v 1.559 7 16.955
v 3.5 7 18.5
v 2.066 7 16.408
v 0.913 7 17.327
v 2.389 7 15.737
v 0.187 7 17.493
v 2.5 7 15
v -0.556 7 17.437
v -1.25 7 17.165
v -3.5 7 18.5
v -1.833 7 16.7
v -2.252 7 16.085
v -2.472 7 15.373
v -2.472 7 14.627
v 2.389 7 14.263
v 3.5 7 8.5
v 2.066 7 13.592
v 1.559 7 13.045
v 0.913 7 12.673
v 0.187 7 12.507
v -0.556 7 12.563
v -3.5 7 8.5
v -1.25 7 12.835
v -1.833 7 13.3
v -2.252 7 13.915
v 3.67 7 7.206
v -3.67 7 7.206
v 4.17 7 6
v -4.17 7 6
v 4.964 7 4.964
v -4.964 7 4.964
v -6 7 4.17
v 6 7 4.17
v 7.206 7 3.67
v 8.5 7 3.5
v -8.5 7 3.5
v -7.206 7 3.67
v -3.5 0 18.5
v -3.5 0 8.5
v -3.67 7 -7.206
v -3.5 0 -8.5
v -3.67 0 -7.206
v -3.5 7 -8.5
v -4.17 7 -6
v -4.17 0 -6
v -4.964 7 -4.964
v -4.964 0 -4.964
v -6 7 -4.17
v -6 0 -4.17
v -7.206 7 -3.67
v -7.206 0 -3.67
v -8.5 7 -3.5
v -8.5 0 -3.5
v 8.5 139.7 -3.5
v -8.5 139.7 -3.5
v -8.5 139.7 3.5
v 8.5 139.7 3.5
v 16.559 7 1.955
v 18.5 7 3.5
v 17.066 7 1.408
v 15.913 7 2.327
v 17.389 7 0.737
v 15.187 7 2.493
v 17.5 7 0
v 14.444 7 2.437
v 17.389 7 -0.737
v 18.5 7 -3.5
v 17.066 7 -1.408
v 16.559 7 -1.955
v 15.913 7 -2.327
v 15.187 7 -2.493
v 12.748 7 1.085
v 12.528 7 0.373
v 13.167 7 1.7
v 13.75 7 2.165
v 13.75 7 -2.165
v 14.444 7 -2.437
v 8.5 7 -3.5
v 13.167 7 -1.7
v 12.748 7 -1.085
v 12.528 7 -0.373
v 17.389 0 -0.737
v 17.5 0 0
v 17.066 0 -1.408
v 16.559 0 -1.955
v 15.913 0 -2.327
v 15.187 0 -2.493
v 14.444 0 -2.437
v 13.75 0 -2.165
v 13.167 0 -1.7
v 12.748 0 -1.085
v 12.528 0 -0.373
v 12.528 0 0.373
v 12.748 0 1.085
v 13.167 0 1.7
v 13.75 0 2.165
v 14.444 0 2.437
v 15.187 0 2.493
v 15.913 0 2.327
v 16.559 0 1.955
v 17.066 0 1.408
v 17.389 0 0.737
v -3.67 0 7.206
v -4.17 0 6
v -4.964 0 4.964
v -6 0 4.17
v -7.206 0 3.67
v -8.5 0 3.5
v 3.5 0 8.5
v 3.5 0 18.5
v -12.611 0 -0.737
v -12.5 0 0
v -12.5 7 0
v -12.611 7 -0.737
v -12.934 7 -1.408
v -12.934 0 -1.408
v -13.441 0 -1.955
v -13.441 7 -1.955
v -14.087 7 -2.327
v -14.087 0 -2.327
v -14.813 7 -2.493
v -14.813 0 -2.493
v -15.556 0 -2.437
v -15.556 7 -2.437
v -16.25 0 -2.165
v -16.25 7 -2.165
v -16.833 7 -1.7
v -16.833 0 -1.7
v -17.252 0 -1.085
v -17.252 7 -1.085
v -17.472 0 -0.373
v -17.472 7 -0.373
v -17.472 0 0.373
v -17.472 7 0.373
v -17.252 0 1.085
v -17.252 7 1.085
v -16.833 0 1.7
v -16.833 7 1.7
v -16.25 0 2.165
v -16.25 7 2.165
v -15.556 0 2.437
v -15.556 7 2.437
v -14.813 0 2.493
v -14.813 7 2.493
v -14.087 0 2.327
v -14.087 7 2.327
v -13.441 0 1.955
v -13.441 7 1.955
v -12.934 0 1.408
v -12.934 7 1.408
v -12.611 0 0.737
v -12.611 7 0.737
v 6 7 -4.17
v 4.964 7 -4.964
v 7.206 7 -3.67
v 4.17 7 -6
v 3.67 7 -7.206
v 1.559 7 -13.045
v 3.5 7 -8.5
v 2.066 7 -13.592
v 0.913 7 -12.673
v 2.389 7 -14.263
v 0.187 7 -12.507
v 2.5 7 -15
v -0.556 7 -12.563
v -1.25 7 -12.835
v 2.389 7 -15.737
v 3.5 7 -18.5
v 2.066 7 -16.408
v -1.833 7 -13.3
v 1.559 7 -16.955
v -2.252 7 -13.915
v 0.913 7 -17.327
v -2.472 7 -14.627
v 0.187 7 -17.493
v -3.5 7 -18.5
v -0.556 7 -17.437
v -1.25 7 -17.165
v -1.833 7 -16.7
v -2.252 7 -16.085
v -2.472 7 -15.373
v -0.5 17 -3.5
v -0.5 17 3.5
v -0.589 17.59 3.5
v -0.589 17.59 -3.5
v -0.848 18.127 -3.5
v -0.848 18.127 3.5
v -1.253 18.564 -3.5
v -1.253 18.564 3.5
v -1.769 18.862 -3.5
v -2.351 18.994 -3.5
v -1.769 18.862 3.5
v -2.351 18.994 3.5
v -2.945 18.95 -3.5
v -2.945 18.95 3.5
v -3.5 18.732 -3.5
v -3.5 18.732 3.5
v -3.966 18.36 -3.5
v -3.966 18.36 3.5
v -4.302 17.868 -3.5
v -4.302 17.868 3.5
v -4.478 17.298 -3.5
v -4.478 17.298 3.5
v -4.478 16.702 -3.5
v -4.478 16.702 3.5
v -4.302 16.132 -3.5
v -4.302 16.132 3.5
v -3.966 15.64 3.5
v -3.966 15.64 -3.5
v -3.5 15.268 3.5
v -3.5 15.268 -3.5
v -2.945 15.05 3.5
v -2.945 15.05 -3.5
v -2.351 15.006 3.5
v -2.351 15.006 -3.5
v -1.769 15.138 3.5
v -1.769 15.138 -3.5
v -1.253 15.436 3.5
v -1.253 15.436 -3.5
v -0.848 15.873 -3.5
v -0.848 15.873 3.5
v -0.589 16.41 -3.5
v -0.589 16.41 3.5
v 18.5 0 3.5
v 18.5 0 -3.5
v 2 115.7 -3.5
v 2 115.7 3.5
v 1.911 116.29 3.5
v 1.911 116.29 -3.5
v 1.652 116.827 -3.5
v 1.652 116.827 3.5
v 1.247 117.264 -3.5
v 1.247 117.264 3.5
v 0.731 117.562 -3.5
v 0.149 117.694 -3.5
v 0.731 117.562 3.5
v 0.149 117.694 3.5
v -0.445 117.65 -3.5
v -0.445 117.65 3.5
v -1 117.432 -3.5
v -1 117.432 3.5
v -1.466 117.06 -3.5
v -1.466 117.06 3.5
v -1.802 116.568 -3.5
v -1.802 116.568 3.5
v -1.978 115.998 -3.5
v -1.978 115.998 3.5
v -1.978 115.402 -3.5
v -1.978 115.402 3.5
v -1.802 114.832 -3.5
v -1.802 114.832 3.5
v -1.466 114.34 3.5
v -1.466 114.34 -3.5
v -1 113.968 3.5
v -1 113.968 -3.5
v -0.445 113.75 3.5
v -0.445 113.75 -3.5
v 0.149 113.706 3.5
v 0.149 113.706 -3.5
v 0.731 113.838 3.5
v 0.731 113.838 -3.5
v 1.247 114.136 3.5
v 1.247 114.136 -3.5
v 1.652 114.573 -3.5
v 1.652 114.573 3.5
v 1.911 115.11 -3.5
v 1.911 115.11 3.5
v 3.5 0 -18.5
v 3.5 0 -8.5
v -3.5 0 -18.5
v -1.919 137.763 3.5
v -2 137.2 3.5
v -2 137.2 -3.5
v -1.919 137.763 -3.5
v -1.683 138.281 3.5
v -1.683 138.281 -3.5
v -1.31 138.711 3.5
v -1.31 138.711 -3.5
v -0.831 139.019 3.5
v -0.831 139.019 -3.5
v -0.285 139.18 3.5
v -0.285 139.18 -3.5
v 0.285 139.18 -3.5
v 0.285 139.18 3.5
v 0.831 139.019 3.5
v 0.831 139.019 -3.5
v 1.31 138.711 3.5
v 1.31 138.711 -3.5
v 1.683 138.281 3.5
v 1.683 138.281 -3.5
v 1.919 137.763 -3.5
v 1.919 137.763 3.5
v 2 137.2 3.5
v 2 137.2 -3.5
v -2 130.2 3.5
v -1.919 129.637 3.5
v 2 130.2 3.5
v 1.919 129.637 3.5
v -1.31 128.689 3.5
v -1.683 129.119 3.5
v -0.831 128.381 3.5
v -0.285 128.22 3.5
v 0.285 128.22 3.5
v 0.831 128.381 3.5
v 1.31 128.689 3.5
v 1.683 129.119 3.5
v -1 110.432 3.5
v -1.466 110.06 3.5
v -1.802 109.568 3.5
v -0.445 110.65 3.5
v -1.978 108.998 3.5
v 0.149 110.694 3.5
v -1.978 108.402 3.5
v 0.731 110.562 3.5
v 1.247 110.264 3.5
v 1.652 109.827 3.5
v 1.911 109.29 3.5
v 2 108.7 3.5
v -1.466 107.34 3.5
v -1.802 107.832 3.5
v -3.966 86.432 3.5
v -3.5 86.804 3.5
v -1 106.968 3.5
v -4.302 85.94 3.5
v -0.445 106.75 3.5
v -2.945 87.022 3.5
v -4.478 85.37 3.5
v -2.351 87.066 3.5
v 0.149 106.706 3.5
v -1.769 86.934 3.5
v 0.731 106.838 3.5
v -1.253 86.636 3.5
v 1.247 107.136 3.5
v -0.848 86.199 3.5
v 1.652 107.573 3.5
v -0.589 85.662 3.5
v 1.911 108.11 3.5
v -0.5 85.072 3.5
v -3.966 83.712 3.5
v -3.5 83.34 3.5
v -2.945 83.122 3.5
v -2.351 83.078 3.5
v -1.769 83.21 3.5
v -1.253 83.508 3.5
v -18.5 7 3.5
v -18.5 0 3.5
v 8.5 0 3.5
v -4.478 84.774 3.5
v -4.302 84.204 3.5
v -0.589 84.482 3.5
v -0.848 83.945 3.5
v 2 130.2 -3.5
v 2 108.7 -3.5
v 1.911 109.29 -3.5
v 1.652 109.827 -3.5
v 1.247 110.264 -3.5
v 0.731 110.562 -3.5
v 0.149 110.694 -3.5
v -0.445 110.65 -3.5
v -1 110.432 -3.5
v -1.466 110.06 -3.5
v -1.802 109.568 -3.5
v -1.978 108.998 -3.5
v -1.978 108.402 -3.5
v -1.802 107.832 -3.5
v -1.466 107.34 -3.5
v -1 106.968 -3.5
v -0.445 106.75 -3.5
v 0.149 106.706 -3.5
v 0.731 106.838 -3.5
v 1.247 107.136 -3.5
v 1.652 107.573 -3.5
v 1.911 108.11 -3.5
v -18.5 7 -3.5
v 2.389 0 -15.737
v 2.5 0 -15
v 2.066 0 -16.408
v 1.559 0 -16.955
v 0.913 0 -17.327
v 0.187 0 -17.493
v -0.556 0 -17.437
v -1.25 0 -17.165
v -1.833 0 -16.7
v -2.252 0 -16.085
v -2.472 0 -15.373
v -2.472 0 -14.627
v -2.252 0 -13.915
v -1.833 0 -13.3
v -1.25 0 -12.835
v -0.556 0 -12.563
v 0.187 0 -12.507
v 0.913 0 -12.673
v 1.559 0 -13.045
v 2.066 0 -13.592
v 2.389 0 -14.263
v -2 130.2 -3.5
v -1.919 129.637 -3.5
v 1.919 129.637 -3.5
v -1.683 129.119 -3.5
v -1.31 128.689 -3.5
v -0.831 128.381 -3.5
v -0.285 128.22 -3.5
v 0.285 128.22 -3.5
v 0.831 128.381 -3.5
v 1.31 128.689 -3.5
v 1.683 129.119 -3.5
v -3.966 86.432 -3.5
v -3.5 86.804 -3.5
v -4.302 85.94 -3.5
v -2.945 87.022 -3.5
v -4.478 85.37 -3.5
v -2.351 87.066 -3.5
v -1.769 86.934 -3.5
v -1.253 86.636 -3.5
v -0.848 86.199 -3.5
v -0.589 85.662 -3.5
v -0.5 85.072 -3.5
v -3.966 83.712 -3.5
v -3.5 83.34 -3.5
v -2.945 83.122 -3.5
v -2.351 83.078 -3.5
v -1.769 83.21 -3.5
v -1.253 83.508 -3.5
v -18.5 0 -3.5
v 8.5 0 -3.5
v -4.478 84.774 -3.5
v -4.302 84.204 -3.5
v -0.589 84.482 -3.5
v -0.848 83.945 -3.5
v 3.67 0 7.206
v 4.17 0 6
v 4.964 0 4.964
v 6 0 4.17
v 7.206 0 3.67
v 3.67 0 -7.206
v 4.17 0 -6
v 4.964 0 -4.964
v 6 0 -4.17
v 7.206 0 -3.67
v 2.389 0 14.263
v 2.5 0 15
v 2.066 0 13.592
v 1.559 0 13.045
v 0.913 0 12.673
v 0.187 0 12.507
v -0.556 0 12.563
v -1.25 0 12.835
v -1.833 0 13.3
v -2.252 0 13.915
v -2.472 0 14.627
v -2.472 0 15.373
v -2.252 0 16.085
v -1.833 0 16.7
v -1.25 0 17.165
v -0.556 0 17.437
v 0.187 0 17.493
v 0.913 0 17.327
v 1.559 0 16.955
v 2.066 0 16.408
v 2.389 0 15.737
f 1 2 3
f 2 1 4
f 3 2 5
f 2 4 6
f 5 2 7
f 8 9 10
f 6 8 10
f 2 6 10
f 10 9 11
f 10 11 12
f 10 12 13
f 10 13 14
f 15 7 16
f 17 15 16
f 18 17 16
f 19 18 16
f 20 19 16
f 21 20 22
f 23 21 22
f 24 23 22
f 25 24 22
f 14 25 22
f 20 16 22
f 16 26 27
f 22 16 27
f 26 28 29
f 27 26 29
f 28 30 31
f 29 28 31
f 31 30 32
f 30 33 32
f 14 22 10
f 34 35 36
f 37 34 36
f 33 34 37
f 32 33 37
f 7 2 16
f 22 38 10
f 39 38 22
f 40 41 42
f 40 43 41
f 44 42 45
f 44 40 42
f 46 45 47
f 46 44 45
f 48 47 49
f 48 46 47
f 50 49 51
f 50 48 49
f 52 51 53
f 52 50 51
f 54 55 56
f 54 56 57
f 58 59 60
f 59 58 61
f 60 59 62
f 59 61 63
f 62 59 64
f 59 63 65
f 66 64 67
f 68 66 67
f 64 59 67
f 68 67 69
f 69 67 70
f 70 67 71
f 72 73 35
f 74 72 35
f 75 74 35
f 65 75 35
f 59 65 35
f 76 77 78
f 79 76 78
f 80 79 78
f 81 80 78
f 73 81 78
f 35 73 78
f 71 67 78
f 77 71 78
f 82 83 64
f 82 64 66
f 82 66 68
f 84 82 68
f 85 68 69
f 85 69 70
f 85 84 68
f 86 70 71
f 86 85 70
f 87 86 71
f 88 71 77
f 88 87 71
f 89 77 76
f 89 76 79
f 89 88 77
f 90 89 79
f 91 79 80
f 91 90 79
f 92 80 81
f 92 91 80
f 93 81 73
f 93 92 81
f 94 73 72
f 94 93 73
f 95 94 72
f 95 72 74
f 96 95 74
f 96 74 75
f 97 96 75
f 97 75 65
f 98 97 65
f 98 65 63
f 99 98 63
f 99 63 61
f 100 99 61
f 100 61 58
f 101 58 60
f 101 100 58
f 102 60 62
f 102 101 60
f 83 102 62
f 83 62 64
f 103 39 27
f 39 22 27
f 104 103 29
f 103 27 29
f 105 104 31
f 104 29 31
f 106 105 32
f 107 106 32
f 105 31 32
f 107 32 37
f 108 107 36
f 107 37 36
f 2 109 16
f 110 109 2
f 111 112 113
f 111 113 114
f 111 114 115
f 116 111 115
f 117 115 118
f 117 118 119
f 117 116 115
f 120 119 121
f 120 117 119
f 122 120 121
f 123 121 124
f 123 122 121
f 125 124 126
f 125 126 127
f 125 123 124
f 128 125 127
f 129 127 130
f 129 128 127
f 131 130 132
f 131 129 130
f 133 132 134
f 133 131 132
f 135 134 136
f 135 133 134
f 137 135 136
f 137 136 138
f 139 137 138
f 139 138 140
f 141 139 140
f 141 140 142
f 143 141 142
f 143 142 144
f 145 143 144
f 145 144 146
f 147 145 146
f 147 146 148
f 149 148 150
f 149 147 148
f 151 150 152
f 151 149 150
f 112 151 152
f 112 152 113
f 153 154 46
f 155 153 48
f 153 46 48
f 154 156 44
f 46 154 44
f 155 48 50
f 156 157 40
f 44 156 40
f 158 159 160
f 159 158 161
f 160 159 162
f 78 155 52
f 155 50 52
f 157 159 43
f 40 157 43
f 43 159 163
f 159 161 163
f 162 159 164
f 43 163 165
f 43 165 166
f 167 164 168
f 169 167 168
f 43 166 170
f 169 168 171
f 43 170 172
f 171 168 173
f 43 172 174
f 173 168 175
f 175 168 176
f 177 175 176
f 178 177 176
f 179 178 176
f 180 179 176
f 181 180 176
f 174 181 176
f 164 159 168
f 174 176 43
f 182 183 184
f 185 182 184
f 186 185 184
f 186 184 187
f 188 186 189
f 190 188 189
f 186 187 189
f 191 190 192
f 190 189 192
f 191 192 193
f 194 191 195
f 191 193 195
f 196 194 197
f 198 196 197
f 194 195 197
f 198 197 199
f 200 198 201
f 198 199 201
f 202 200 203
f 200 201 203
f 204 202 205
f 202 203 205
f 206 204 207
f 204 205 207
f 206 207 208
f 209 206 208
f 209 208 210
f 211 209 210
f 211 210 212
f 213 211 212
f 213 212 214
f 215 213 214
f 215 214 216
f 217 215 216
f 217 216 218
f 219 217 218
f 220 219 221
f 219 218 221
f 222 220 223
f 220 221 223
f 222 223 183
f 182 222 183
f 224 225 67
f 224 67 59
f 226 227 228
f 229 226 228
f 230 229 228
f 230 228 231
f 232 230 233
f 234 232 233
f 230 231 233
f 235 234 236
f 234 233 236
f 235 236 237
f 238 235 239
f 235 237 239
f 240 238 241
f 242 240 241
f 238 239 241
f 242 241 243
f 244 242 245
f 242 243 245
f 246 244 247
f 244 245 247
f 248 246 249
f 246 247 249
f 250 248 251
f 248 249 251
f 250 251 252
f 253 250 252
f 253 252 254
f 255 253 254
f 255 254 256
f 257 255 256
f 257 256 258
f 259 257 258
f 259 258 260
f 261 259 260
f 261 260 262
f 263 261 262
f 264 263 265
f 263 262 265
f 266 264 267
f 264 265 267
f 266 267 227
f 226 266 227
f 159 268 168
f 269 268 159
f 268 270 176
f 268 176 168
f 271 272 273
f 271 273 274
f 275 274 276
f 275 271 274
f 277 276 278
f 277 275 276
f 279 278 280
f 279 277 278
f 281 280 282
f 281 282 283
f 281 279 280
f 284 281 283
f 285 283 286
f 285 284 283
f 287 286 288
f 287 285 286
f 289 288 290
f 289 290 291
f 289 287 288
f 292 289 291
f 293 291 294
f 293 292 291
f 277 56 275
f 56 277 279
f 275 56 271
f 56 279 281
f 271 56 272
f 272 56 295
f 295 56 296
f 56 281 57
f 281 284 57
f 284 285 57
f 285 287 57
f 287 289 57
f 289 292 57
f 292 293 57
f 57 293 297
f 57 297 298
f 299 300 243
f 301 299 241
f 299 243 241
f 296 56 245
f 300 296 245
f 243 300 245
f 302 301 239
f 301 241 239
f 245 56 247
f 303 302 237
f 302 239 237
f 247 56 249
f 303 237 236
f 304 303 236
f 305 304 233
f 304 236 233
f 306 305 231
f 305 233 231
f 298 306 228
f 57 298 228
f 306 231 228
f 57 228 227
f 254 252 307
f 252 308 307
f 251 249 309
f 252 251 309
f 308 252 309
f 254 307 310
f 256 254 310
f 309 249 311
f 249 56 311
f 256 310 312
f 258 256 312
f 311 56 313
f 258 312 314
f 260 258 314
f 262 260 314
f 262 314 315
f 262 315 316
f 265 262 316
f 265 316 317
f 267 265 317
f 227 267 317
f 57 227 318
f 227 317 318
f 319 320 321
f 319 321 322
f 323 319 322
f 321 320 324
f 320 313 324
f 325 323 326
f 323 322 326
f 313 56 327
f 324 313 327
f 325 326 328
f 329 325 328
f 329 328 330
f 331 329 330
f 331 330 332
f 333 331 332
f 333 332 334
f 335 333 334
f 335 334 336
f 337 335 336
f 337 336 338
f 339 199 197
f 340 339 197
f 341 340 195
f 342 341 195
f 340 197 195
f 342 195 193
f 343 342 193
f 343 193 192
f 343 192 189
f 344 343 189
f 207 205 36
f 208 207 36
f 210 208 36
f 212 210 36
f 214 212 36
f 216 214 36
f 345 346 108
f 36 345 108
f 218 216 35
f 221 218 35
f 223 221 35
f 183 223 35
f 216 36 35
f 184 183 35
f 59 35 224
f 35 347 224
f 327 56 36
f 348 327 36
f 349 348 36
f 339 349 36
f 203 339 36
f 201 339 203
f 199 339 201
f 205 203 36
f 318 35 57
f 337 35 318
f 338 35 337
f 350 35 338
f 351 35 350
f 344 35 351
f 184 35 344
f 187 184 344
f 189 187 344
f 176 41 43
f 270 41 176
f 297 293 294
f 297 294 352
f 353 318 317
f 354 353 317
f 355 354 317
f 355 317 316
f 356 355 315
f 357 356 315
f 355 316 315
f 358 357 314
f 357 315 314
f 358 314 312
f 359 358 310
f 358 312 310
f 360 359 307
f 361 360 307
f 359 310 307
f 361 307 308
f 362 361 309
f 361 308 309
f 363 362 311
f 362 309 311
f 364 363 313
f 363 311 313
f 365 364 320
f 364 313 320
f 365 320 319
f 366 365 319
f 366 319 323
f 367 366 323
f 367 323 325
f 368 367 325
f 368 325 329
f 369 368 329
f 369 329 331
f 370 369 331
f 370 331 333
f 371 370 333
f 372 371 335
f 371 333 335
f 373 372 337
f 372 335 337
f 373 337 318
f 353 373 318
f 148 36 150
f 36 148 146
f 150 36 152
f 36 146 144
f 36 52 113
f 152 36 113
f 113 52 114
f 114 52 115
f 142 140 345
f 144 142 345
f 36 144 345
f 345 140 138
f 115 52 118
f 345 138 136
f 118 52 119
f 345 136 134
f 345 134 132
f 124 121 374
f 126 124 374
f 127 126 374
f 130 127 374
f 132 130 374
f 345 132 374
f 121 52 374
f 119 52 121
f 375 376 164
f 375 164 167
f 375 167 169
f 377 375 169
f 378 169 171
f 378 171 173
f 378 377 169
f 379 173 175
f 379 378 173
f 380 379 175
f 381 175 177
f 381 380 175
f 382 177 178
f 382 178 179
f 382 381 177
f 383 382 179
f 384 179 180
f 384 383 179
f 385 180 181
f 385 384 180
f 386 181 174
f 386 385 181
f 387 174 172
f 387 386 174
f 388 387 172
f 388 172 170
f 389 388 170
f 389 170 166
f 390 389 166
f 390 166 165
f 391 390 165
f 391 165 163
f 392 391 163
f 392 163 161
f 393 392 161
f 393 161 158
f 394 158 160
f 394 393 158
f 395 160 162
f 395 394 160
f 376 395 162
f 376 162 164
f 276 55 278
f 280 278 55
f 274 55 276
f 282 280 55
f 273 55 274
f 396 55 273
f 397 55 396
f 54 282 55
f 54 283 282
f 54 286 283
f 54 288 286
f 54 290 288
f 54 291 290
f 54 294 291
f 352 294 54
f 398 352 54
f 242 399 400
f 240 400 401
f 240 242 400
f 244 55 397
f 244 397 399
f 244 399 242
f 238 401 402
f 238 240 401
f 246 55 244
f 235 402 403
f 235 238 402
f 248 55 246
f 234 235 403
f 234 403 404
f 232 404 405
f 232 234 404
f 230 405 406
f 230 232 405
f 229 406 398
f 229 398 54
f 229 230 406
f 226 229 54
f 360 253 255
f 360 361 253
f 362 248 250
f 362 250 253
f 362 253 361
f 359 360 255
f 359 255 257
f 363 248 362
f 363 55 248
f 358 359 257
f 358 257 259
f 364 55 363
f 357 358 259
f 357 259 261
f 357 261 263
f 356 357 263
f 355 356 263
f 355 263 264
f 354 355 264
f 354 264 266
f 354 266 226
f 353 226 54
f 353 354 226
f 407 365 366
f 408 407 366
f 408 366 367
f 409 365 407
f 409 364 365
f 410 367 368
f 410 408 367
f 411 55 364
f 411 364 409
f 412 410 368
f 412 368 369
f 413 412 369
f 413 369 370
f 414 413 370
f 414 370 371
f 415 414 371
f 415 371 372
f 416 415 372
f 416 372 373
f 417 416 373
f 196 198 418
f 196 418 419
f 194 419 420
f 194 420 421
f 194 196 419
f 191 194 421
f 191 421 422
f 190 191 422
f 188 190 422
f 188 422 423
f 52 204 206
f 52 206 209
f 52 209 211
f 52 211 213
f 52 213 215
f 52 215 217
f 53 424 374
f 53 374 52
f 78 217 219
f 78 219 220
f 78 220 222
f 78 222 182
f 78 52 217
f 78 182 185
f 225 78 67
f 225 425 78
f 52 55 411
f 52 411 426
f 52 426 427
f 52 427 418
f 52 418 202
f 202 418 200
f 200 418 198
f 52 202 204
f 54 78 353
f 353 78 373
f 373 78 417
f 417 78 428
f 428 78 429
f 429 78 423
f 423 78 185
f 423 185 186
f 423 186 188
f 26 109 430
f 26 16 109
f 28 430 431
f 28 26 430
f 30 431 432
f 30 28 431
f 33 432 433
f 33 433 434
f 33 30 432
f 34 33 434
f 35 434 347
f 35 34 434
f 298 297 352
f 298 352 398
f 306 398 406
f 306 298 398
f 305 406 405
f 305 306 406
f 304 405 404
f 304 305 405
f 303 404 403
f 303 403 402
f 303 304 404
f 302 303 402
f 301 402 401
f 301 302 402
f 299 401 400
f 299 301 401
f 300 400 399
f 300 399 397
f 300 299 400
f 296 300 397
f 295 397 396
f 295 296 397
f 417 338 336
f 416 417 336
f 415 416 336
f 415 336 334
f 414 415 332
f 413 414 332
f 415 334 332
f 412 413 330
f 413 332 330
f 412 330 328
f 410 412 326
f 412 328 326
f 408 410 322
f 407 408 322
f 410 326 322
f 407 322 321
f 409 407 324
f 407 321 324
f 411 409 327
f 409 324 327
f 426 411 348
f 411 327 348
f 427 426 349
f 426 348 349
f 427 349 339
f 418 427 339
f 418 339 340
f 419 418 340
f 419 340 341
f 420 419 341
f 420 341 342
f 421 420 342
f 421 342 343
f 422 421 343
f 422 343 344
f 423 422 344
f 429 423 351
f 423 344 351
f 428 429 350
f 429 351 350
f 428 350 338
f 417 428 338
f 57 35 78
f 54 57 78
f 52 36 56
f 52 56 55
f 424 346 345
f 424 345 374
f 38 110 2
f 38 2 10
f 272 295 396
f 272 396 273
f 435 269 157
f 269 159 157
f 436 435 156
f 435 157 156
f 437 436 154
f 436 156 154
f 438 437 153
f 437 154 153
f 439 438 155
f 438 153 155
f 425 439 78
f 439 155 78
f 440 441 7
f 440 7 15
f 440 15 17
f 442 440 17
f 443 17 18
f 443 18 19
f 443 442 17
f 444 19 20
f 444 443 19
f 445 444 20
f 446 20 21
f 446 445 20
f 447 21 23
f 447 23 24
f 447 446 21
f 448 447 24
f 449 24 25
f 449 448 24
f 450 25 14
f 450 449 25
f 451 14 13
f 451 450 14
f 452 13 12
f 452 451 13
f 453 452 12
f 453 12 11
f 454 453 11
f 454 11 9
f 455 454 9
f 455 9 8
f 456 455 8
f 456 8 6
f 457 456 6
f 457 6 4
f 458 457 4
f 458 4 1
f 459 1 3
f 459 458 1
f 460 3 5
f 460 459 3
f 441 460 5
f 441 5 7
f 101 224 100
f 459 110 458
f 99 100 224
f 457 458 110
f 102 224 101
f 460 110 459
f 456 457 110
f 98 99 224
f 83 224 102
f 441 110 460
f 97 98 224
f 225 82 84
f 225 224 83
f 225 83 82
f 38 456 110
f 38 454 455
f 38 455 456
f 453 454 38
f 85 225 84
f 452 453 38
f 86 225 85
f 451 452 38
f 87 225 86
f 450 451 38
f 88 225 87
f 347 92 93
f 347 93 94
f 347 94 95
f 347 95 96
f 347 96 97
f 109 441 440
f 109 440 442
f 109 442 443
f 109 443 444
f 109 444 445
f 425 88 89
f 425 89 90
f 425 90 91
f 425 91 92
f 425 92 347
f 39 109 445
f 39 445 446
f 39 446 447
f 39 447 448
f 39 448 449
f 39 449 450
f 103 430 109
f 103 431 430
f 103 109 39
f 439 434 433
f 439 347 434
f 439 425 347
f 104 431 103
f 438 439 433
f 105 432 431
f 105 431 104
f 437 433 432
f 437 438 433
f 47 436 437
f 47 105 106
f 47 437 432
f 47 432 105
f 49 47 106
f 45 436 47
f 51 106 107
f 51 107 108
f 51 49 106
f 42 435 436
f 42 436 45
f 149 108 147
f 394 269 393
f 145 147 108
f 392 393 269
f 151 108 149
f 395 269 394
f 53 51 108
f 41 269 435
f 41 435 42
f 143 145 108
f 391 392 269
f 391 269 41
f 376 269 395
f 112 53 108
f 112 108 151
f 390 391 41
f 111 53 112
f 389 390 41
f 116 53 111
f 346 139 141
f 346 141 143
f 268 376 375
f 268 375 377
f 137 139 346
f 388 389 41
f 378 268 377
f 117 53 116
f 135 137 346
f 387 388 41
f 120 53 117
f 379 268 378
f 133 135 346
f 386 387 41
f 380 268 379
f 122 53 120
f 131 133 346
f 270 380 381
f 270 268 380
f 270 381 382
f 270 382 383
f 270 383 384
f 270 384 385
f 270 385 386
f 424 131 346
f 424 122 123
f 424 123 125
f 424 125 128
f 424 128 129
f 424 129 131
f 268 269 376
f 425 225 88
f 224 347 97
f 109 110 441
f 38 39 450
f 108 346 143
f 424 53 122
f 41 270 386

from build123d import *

# Parameters (mm, degrees)
SKETCH1_W           = 17
SKETCH1_H           = 7
BOSS_EXTRUDE1_DEPTH = 139.7
SKETCH2_R           = 2.5
BOSS_EXTRUDE2_DEPTH = 7
FILLET1_R           = 5
SKETCH3_R           = 2
CUT_EXTRUDE1_DEPTH  = 7
SKETCH4_R           = 2
CUT_EXTRUDE2_DEPTH  = 7


with BuildPart() as part:
    # Sketch1 → Boss-Extrude1 (new body)
    with BuildSketch(Plane(origin=(0, 0, 0), x_dir=(1, 0, 0), z_dir=(0, 1, 0))):
        Rectangle(SKETCH1_W, SKETCH1_H)
    extrude(amount=BOSS_EXTRUDE1_DEPTH)

    # Sketch2 → Boss-Extrude2 (add)
    with BuildSketch(Plane(origin=(0, 0, 0), x_dir=(1, 0, 0), z_dir=(0, 1, 0))):
        Polygon((-3.5, 3.5), (-3.5, 18.5), (3.5, 18.5), (3.5, 3.5), (8.5, 3.5), (18.5, 3.5), (18.5, -3.5), (8.5, -3.5), (3.5, -3.5), (3.5, -18.5), (-3.5, -18.5), (-3.5, -3.5), (-8.5, -3.5), (-18.5, -3.5), (-18.5, 3.5), (-8.5, 3.5), align=None)
        with Locations((0, 15)):
            Circle(SKETCH2_R, mode=Mode.SUBTRACT)
        with Locations((15, 0)):
            Circle(SKETCH2_R, mode=Mode.SUBTRACT)
        with Locations((0, -15)):
            Circle(SKETCH2_R, mode=Mode.SUBTRACT)
        with Locations((-15, 0)):
            Circle(SKETCH2_R, mode=Mode.SUBTRACT)
    extrude(amount=BOSS_EXTRUDE2_DEPTH)

    # Fillet1
    fillet1_edges = [part.edges().sort_by_distance(p)[0] for p in [
        (-3.5, 3.5, 3.5),
        (3.5, 3.5, 3.5),
        (3.5, 3.5, -3.5),
        (-3.5, 3.5, -3.5),
    ]]
    fillet(fillet1_edges, radius=FILLET1_R)

    # Sketch3 → Cut-Extrude1 (cut)
    with BuildSketch(Plane.XY.offset(3.5)):
        with Locations((-2.5, 85.072)):
            Circle(SKETCH3_R)
        with Locations((-2.5, 17)):
            Circle(SKETCH3_R)
    extrude(amount=-CUT_EXTRUDE1_DEPTH, mode=Mode.SUBTRACT)

    # Sketch4 → Cut-Extrude2 (cut)
    with BuildSketch(Plane.XY.offset(3.5)):
        with Locations((0, 115.7)):
            Circle(SKETCH4_R)
        with Locations((0, 108.7)):
            Circle(SKETCH4_R)
        with BuildLine():
            Line((2, 137.2), (2, 130.2))
            ThreePointArc((2, 130.2), (0, 128.2), (-2, 130.2))
            Line((-2, 130.2), (-2, 137.2))
            ThreePointArc((-2, 137.2), (0, 139.2), (2, 137.2))
        make_face()
    extrude(amount=-CUT_EXTRUDE2_DEPTH, mode=Mode.SUBTRACT)


solid = part.part
